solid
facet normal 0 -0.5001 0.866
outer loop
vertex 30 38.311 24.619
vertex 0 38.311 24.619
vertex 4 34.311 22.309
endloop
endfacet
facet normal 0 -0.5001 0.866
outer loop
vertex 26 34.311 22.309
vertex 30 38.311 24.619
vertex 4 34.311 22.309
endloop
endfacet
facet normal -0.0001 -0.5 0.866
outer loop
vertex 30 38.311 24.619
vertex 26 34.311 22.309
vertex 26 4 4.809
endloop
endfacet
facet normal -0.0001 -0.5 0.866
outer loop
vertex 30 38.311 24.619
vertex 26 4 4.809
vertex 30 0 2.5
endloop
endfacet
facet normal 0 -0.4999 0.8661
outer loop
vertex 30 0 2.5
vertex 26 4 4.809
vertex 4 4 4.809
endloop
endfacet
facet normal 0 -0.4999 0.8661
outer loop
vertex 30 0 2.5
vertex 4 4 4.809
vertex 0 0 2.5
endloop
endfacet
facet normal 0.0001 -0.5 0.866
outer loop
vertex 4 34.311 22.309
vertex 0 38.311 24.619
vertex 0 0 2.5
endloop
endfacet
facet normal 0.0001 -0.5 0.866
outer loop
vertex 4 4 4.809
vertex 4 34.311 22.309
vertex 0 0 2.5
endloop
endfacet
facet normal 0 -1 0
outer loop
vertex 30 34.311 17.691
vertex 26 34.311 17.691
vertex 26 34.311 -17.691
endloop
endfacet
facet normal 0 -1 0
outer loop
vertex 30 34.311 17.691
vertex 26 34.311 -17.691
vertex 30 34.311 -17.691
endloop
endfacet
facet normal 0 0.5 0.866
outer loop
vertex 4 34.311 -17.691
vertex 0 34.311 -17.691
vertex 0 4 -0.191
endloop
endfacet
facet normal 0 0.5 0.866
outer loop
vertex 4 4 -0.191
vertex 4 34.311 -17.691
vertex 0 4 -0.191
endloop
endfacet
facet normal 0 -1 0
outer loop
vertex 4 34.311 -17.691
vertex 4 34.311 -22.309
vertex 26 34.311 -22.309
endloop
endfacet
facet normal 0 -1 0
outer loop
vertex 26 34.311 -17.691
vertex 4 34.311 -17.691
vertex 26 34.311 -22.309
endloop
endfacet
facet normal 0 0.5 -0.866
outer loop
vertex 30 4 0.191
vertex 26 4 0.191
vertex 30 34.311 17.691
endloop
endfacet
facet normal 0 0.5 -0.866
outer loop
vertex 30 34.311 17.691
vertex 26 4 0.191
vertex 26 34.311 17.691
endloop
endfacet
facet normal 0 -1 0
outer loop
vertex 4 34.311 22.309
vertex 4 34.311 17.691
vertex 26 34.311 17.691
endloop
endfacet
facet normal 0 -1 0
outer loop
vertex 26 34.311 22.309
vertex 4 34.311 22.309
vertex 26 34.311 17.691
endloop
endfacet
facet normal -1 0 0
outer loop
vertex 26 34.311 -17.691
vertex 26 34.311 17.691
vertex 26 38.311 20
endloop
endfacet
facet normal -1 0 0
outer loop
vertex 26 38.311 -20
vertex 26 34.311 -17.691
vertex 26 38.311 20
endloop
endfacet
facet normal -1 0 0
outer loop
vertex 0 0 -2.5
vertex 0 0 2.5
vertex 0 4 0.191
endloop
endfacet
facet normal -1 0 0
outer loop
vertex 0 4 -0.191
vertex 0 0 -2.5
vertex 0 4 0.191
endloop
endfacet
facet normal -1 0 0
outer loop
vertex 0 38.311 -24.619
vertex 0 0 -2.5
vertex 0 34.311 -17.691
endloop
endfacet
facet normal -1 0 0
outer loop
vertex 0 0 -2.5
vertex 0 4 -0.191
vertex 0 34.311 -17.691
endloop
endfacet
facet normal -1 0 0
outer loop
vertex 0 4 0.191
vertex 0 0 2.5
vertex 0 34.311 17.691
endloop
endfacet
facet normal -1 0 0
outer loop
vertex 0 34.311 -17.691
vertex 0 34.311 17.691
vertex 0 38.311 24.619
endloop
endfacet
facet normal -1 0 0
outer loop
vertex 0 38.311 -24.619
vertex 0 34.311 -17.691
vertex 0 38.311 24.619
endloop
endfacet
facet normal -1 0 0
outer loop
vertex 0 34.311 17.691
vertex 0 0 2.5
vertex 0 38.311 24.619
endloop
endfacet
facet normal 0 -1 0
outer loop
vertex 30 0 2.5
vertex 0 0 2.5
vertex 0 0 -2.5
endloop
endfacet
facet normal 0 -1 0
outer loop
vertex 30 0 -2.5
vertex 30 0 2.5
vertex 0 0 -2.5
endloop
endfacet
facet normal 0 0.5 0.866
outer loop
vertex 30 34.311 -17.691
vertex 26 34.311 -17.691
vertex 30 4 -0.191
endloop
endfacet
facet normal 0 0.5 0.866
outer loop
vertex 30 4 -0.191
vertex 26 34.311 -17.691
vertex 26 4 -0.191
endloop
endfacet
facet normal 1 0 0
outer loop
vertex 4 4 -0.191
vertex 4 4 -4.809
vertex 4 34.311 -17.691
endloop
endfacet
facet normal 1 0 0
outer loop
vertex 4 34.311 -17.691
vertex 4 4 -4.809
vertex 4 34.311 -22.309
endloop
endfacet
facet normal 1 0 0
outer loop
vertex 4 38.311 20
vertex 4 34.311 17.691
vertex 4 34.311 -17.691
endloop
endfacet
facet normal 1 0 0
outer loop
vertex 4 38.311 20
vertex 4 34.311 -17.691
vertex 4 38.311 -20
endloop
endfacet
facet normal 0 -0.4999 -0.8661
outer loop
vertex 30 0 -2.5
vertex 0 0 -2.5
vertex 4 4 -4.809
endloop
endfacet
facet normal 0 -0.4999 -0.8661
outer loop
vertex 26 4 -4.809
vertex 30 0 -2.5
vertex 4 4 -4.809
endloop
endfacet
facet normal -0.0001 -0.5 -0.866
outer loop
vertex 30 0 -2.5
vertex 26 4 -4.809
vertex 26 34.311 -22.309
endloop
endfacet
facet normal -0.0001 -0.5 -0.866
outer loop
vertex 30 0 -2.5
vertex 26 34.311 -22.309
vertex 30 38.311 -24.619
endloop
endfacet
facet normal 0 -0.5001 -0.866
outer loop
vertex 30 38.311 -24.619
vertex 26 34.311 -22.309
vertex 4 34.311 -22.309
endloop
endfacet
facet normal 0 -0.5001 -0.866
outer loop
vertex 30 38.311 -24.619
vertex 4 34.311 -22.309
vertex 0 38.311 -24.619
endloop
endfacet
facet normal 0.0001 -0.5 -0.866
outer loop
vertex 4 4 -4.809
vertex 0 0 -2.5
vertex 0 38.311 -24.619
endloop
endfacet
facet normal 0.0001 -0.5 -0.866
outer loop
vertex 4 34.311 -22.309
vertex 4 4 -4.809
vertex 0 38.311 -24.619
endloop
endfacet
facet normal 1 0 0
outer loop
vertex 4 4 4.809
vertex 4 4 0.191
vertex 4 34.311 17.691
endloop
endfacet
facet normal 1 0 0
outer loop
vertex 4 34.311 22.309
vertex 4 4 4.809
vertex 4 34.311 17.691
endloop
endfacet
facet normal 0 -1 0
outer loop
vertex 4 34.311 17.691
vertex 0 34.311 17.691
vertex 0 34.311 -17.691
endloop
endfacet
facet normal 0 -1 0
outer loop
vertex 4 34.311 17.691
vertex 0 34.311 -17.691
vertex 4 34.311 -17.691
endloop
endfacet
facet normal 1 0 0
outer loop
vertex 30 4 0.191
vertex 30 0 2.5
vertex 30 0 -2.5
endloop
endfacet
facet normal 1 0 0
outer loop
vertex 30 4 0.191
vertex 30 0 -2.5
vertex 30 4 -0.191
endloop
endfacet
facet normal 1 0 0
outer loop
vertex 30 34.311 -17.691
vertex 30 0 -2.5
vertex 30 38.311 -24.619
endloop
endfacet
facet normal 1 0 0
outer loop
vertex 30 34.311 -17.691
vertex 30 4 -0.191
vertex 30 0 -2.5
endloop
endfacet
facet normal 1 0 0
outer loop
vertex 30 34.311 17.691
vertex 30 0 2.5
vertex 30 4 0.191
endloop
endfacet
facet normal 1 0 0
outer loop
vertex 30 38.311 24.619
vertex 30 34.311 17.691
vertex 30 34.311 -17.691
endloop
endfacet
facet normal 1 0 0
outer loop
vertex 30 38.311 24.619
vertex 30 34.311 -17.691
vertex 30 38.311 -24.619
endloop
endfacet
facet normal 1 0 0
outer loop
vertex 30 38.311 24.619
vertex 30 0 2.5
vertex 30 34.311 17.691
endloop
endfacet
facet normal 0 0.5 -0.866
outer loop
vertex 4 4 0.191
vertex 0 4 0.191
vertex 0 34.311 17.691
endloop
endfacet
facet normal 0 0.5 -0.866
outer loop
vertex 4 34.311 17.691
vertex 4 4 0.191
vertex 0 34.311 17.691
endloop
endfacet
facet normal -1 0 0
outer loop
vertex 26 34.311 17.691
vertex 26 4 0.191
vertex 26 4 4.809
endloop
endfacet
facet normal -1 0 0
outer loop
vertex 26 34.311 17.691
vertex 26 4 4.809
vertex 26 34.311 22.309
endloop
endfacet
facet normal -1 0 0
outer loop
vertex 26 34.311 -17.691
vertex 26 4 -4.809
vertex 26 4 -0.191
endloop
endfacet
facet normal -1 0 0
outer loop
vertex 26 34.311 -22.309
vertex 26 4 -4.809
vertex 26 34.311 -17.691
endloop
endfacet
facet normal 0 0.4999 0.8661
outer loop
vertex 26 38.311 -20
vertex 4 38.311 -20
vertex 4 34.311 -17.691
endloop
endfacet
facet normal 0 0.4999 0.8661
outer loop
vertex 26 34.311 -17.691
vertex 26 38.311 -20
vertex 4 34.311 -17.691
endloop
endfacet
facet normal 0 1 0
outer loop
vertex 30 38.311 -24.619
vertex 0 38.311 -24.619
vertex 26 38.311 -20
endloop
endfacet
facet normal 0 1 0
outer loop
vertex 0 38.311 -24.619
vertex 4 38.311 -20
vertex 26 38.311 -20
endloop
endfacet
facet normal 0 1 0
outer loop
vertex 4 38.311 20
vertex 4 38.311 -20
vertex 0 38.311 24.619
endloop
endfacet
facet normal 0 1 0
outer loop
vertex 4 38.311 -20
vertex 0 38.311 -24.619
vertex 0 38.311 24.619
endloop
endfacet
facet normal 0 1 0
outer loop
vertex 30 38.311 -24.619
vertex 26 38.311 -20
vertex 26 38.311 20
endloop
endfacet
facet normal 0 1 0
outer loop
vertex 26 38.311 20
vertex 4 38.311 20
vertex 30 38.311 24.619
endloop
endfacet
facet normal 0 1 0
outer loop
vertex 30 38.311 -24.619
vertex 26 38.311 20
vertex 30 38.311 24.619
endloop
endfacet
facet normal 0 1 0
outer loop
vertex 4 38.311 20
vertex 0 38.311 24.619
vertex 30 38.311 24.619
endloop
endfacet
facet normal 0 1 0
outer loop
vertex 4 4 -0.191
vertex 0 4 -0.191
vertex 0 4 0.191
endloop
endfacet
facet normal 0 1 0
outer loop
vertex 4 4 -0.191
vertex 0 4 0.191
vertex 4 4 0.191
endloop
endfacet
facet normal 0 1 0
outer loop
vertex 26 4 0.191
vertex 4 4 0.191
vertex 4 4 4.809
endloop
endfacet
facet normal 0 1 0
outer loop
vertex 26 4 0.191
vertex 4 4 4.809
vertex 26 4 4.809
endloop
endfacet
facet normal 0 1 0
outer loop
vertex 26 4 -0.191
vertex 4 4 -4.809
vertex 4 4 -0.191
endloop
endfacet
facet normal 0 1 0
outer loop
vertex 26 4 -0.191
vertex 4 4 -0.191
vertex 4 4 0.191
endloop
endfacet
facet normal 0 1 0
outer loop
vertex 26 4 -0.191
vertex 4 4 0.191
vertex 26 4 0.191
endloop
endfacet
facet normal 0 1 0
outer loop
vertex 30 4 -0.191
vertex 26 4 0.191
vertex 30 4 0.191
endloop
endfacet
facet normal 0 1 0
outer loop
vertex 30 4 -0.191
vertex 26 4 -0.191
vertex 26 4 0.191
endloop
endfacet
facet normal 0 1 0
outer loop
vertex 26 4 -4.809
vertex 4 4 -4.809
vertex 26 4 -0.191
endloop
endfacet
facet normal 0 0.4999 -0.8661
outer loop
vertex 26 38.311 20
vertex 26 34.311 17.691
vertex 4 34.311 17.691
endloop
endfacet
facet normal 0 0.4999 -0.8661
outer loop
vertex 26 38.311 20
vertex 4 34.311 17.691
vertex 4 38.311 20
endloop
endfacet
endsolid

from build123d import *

# Parameters (mm, degrees)
BOSS_EXTRUDE2_DEPTH             = 30
CUT_EXTRUDE1_DEPTH              = 55.53264752
CUT_EXTRUDE1_DEPTH_BACK         = 55.53264752
SKETCH3_W                       = 22
SKETCH3_H                       = 30.310889132
BOSS_EXTRUDE3_REACH             = 56.533
SKETCH4_W                       = 4
SKETCH4_H                       = 4
BOSS_EXTRUDE3_DIRECTION_2_REACH = 56.533


with BuildPart() as part:
    # Sketch2 → Boss-Extrude2 (new body)
    with BuildSketch(Plane(origin=(0, 0, 0), x_dir=(0, 0, -1), z_dir=(1, 0, 0))):
        Polygon((-2.5, 0), (2.5, 0), (24.618802154, 38.310889132), (20, 38.310889132), (0.190598923, 4), (-0.190598923, 4), (-20, 38.310889132), (-24.618802154, 38.310889132), align=None)
    extrude(amount=BOSS_EXTRUDE2_DEPTH)

    # Sketch3 → Cut-Extrude1 (cut, two sides: drawn at the far end of the back side and taken through both)
    with BuildSketch(Plane.XY.offset(-CUT_EXTRUDE1_DEPTH_BACK)):
        with Locations((15, 19.155444566)):
            Rectangle(SKETCH3_W, SKETCH3_H)
    extrude(amount=CUT_EXTRUDE1_DEPTH + CUT_EXTRUDE1_DEPTH_BACK, mode=Mode.SUBTRACT)

    # Boss-Extrude3: up to this plane
    boss_extrude3_end = Plane(origin=(30, 4, 0.190598923), z_dir=(0, -0.49999999999999795, 0.8660254037844398))
    # Sketch4 → Boss-Extrude3 (add, up to the surface)
    with BuildSketch(Plane.XY, mode=Mode.PRIVATE) as boss_extrude3_sk1:
        with Locations((2, 36.310889132)):
            Rectangle(SKETCH4_W, SKETCH4_H)
    boss_extrude3_tool1 = split(extrude(boss_extrude3_sk1.sketch, amount=BOSS_EXTRUDE3_REACH, mode=Mode.PRIVATE), bisect_by=boss_extrude3_end, keep=Keep.BOTH, mode=Mode.PRIVATE)
    add(boss_extrude3_tool1.solids().sort_by_distance((2, 36.310889, 0))[0])
    # Sketch4 → Boss-Extrude3 (add, up to the surface)
    with BuildSketch(Plane.XY, mode=Mode.PRIVATE) as boss_extrude3_sk2:
        with Locations((28, 36.310889132)):
            Rectangle(SKETCH4_W, SKETCH4_H)
    boss_extrude3_tool2 = split(extrude(boss_extrude3_sk2.sketch, amount=BOSS_EXTRUDE3_REACH, mode=Mode.PRIVATE), bisect_by=boss_extrude3_end, keep=Keep.BOTH, mode=Mode.PRIVATE)
    add(boss_extrude3_tool2.solids().sort_by_distance((28, 36.310889, 0))[0])

    # Boss-Extrude3 direction 2: up to this plane
    boss_extrude3_direction_2_end = Plane(origin=(30, 38.310889132, -20), z_dir=(0, -0.49999999999999756, -0.8660254037844402))
    # Sketch4 → Boss-Extrude3 direction 2 (add, up to the surface)
    with BuildSketch(Plane.XY, mode=Mode.PRIVATE) as boss_extrude3_direction_2_sk1:
        with Locations((2, 36.310889132)):
            Rectangle(SKETCH4_W, SKETCH4_H)
    boss_extrude3_direction_2_tool1 = split(extrude(boss_extrude3_direction_2_sk1.sketch, amount=-BOSS_EXTRUDE3_DIRECTION_2_REACH, mode=Mode.PRIVATE), bisect_by=boss_extrude3_direction_2_end, keep=Keep.BOTH, mode=Mode.PRIVATE)
    add(boss_extrude3_direction_2_tool1.solids().sort_by_distance((2, 36.310889, 0))[0])
    # Sketch4 → Boss-Extrude3 direction 2 (add, up to the surface)
    with BuildSketch(Plane.XY, mode=Mode.PRIVATE) as boss_extrude3_direction_2_sk2:
        with Locations((28, 36.310889132)):
            Rectangle(SKETCH4_W, SKETCH4_H)
    boss_extrude3_direction_2_tool2 = split(extrude(boss_extrude3_direction_2_sk2.sketch, amount=-BOSS_EXTRUDE3_DIRECTION_2_REACH, mode=Mode.PRIVATE), bisect_by=boss_extrude3_direction_2_end, keep=Keep.BOTH, mode=Mode.PRIVATE)
    add(boss_extrude3_direction_2_tool2.solids().sort_by_distance((28, 36.310889, 0))[0])


solid = part.part
